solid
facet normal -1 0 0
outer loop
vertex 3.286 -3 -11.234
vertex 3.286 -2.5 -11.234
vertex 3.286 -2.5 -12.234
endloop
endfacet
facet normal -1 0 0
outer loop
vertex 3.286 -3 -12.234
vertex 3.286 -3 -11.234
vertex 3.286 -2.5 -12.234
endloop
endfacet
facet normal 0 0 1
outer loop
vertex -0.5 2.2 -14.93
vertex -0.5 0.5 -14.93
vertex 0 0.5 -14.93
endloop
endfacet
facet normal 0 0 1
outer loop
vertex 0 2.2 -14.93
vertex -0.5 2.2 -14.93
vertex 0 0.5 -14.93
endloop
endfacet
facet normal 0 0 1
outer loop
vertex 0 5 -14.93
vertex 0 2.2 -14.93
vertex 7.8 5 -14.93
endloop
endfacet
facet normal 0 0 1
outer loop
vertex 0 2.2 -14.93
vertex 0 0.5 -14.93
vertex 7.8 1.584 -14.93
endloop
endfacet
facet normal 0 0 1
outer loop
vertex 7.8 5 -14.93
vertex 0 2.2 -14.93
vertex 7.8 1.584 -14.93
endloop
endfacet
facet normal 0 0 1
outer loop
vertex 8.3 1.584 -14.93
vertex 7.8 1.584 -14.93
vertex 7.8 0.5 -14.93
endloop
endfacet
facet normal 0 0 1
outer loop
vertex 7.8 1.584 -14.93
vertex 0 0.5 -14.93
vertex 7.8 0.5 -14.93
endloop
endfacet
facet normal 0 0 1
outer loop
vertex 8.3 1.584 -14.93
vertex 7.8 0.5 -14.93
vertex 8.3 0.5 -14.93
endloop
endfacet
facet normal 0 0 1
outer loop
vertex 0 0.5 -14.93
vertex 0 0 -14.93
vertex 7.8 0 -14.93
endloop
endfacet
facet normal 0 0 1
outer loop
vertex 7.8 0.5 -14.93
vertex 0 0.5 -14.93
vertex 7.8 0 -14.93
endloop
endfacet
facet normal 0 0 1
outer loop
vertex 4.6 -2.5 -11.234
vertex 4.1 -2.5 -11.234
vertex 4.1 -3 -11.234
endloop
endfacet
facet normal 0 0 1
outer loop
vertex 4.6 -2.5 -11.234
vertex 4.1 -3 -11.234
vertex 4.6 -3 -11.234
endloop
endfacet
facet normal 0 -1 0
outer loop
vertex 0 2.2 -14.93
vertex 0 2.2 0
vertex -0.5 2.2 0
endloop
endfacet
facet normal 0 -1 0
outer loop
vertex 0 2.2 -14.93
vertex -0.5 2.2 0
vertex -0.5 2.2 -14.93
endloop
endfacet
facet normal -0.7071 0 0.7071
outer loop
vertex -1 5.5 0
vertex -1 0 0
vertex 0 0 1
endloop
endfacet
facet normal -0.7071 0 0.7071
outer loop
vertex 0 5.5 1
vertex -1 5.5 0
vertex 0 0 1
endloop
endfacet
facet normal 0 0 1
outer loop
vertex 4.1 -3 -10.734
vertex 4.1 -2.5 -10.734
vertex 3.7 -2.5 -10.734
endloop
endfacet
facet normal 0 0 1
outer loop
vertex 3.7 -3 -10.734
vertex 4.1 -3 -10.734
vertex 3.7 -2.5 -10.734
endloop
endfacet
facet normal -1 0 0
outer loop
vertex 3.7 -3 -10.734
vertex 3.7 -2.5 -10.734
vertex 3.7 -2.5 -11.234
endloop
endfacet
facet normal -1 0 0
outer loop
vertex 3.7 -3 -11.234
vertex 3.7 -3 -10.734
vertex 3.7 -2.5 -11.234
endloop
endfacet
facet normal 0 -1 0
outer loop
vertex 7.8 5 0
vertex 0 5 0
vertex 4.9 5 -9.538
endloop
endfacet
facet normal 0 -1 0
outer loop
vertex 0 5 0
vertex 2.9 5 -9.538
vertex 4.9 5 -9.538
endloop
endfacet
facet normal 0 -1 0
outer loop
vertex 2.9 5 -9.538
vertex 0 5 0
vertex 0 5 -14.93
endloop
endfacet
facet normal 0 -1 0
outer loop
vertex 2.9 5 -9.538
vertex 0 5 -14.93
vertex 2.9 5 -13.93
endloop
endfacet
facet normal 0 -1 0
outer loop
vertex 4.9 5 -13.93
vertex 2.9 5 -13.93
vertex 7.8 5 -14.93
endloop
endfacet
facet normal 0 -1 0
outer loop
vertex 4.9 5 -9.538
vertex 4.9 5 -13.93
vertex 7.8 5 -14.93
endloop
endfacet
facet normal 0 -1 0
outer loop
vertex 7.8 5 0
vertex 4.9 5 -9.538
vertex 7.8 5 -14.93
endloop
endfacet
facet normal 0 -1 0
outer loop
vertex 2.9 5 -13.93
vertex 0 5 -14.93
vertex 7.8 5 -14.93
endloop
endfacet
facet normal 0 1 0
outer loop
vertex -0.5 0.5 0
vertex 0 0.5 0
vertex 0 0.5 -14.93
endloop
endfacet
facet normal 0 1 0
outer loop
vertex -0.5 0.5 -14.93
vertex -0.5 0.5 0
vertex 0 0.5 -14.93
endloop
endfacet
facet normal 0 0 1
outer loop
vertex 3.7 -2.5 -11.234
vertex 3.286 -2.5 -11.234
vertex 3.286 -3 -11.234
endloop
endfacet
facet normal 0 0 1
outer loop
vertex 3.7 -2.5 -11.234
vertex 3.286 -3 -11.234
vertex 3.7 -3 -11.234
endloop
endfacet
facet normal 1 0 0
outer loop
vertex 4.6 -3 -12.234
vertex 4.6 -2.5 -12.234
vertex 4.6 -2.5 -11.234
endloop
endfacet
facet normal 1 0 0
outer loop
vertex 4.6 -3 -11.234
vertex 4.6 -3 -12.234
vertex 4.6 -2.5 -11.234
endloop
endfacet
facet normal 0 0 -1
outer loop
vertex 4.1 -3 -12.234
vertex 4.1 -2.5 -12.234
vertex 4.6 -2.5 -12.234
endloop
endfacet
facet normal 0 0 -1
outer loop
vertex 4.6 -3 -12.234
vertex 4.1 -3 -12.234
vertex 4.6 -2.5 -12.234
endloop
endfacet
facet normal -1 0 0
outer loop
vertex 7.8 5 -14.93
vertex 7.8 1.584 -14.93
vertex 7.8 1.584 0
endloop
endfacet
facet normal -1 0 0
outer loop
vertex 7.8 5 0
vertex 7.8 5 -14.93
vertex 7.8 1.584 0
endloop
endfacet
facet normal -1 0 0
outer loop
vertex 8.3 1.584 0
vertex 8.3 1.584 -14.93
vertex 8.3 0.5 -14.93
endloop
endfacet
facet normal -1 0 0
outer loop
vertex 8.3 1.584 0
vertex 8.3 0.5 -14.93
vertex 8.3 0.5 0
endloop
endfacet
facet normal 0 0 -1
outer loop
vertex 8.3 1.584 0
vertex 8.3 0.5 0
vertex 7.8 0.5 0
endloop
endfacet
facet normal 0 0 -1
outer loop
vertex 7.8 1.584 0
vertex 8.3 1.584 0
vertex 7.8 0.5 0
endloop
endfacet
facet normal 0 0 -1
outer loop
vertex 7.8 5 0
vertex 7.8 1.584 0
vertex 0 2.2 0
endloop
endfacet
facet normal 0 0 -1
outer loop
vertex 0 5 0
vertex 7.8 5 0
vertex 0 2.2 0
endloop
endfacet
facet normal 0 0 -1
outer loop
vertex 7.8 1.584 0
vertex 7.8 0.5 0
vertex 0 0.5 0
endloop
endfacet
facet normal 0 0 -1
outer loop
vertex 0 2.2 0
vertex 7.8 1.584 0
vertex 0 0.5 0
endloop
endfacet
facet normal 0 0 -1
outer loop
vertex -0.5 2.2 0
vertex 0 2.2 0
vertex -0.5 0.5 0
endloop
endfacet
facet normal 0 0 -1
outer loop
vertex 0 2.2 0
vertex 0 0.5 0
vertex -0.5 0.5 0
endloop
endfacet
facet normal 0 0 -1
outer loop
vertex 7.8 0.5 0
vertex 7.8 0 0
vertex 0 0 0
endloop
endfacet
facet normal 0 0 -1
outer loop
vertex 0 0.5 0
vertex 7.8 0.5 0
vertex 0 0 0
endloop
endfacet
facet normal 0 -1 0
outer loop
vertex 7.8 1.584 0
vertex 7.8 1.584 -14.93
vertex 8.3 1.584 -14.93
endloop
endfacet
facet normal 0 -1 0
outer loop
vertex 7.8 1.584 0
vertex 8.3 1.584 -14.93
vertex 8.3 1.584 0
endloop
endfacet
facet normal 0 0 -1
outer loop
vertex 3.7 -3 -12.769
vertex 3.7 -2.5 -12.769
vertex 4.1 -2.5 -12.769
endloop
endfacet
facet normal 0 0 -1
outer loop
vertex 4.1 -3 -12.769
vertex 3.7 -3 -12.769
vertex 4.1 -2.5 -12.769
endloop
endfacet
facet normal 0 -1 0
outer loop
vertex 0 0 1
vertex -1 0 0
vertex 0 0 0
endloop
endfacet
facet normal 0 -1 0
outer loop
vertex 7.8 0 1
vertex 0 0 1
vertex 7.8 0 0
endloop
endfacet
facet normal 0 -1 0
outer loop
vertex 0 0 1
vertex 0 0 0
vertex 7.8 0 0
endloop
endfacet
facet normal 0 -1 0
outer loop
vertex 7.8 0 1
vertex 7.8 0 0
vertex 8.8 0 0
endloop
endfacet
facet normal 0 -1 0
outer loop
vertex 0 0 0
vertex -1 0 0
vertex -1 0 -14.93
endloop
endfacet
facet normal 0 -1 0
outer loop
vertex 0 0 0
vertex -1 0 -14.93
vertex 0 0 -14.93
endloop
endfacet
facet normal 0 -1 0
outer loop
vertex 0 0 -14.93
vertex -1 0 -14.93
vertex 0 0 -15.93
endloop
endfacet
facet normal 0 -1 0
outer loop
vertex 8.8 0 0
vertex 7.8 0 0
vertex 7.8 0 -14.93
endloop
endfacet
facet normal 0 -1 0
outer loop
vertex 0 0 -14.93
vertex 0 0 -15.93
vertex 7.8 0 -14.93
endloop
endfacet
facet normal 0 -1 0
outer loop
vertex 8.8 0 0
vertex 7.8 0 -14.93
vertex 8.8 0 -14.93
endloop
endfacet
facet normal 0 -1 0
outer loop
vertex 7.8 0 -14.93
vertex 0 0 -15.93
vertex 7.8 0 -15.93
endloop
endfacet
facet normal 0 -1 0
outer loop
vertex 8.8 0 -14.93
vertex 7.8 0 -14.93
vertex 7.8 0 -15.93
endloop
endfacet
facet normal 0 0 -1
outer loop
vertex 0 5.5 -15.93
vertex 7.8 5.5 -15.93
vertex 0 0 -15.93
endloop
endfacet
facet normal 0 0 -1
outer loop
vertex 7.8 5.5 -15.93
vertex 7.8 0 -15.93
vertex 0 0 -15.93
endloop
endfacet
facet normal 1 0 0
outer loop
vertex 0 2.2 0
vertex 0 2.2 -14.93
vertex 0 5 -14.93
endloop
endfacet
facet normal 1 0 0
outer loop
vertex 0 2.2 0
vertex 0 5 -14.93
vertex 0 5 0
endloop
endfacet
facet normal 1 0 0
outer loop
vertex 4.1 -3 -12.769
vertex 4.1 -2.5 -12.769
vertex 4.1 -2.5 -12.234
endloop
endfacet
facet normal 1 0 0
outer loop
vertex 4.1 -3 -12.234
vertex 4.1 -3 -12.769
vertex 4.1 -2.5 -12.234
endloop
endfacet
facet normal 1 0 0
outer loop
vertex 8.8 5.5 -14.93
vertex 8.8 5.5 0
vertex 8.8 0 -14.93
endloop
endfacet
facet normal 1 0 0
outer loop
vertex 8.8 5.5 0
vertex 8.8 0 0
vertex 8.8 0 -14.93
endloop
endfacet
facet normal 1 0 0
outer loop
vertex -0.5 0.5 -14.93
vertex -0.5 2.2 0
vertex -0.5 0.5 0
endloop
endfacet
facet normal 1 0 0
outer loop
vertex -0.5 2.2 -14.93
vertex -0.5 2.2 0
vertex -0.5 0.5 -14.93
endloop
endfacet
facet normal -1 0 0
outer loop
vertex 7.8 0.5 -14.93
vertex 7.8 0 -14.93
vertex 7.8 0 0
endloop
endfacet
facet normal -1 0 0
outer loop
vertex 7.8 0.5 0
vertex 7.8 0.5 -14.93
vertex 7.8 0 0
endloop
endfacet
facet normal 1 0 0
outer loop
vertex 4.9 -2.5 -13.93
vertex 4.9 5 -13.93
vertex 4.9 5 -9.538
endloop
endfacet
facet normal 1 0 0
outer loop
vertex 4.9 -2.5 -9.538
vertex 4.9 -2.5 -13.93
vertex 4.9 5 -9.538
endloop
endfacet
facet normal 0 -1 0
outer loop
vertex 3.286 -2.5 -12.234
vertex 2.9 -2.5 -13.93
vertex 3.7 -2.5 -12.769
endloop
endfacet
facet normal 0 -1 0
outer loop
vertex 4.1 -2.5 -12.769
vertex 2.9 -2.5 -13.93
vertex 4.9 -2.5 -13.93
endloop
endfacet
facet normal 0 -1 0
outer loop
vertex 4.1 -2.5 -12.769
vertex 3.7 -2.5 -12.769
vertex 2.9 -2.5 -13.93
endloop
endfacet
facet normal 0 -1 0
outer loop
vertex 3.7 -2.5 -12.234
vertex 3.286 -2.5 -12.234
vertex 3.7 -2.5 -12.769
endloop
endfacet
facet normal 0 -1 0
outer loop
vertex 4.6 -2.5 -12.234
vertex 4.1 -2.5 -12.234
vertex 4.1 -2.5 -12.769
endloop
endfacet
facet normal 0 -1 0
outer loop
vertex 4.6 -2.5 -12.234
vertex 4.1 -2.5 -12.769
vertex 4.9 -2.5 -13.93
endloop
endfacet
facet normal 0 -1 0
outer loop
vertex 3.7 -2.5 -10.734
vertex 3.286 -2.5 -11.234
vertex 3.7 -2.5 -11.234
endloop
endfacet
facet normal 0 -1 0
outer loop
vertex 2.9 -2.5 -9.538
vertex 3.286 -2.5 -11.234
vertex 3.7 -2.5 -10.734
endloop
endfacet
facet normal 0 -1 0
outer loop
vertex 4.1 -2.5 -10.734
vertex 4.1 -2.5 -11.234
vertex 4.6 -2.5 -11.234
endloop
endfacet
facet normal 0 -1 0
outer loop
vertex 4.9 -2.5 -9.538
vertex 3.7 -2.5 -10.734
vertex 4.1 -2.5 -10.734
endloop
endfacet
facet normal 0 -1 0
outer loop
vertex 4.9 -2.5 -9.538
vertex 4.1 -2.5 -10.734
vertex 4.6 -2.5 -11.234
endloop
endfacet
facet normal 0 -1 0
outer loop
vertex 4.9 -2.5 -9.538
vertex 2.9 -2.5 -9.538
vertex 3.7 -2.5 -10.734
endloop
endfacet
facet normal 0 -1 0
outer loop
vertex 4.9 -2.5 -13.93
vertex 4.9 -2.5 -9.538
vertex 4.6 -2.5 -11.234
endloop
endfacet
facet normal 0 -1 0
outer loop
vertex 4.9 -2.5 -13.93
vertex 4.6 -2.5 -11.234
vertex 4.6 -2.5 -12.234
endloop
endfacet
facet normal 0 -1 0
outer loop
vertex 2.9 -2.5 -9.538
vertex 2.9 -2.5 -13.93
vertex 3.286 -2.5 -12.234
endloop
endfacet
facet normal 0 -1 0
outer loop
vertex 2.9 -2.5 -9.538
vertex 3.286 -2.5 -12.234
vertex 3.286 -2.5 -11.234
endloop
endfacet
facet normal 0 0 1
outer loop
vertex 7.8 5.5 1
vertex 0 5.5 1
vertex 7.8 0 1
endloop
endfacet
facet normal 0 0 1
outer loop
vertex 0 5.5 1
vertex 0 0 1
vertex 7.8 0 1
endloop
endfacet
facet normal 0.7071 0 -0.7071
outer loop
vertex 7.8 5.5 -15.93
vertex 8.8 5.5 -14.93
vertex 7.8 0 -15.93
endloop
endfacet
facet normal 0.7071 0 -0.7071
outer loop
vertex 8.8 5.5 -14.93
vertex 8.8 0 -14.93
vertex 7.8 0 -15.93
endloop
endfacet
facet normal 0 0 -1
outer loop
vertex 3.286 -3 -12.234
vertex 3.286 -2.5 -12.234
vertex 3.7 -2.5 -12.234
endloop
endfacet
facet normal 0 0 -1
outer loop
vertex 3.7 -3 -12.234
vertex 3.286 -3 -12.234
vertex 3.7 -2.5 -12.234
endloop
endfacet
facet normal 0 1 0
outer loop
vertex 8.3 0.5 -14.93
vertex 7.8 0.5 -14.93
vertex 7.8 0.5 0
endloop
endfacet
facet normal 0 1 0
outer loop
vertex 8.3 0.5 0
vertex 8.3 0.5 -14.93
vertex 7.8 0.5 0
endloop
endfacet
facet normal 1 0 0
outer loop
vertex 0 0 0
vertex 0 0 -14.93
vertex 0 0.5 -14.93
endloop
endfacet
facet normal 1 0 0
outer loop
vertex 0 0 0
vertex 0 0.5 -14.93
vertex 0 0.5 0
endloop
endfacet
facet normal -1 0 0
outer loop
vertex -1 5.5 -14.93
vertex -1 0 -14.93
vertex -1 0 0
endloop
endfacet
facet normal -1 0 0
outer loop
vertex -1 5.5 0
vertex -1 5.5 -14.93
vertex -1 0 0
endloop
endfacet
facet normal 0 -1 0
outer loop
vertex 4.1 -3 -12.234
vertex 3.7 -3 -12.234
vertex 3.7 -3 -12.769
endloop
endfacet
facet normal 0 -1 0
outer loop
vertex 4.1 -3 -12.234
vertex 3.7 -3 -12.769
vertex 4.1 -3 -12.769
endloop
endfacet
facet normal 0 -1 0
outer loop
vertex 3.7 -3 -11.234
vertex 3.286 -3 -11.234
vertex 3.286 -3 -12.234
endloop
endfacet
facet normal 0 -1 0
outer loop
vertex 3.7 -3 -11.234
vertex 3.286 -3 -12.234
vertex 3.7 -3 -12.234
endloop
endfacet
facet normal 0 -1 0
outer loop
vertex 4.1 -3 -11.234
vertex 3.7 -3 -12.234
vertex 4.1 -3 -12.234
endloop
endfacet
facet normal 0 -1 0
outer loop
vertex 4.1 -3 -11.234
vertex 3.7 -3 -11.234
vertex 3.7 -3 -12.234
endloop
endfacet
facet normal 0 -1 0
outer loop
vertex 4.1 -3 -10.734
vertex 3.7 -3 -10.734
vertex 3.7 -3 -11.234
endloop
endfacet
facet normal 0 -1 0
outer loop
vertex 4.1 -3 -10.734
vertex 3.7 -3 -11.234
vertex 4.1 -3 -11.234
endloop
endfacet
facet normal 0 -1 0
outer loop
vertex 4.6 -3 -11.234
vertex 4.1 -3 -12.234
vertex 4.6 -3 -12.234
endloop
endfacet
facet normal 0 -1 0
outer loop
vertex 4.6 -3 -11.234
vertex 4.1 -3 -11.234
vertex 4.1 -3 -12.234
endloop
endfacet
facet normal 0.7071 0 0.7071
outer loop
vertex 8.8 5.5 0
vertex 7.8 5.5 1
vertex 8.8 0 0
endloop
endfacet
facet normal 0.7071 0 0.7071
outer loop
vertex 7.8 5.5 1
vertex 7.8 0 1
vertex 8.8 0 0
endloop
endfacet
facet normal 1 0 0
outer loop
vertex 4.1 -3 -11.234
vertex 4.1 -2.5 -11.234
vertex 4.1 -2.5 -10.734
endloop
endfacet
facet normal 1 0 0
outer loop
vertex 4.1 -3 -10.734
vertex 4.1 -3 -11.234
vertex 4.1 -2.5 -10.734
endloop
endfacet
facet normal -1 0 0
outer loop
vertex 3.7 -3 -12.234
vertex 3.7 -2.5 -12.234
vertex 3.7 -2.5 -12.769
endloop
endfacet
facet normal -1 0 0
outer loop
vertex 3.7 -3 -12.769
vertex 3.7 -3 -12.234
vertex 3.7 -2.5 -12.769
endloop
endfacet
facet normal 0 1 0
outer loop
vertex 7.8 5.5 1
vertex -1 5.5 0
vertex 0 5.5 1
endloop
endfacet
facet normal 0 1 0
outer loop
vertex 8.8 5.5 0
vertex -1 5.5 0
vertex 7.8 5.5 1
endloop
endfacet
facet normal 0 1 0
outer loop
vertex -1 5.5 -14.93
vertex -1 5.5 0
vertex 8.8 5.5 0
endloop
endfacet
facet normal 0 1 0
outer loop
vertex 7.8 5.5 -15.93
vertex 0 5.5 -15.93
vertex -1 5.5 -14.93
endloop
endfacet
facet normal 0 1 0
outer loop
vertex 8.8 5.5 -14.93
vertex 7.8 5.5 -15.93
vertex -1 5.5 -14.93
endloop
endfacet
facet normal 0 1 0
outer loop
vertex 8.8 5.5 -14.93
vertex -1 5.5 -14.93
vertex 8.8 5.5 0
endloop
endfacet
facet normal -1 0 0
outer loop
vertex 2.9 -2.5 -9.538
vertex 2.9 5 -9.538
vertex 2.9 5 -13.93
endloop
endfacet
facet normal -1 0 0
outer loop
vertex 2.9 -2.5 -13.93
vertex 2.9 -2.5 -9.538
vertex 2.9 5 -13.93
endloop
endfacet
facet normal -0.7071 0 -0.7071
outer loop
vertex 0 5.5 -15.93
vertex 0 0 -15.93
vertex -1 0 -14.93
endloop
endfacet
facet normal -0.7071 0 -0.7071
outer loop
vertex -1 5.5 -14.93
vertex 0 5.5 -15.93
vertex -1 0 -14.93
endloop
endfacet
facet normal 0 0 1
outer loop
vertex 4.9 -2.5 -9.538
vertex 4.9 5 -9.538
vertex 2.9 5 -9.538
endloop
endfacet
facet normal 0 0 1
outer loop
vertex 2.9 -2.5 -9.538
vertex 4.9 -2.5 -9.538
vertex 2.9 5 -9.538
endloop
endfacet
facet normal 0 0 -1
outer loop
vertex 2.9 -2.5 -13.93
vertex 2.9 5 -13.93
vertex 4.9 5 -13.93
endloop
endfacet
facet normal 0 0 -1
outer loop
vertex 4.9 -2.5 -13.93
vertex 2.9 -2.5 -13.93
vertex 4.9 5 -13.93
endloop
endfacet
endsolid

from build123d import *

# Parameters (mm, degrees)
SKETCH1_W           = 7.8
SKETCH1_H           = 1
BOSS_EXTRUDE1_DEPTH = 5
SKETCH2_W           = 7.465
SKETCH2_H           = 0.5
CUT_EXTRUDE1_DEPTH  = 0.5
SKETCH3_W           = 14.93
SKETCH3_H           = 0.5
CUT_EXTRUDE2_DEPTH  = 0.5
BOSS_EXTRUDE2_DEPTH = 0.5
SKETCH5_W           = 1
SKETCH5_H           = 2.195949596
BOSS_EXTRUDE3_DEPTH = 7.5
SKETCH6_W           = 0.2
SKETCH6_H           = 0.5
SKETCH6_W_2         = 0.5
SKETCH6_W_3         = 0.413933432
BOSS_EXTRUDE4_DEPTH = 0.5
SKETCH8_W           = 14.93
SKETCH8_H           = 0.5
CUT_EXTRUDE3_DEPTH  = 0.5
SKETCH9_W           = 14.93
SKETCH9_H           = 0.084331677
CUT_EXTRUDE4_DEPTH  = 0.5
SKETCH12_W          = 14.93
SKETCH12_H          = 1.2
CUT_EXTRUDE5_DEPTH  = 0.5


with BuildPart() as part:
    # Sketch1 → Boss-Extrude1 (new body)
    with BuildSketch(Plane(origin=(0, 0, 0), x_dir=(1, 0, 0), z_dir=(0, 1, 0))):
        with Locations((3.9, 15.43)):
            Rectangle(SKETCH1_W, SKETCH1_H)
        Polygon((7.8, 15.93), (8.8, 14.93), (7.8, 14.93), align=None)
        Polygon((7.8, -1), (7.8, 0), (7.8, 14.93), (8.8, 14.93), (8.8, 0), align=None)
        Polygon((-1, 0), (0, 0), (7.8, 0), (7.8, -1), (0, -1), align=None)
        Polygon((0, 15.93), (0, 14.93), (0, 0), (-1, 0), (-1, 14.93), align=None)
    extrude(amount=BOSS_EXTRUDE1_DEPTH)

    # Sketch2 → Cut-Extrude1 (cut)
    with BuildSketch(Plane(origin=(0, 0, 0), x_dir=(0, 0, -1), z_dir=(1, 0, 0))):
        with Locations((11.1975, 0.75)):
            Rectangle(SKETCH2_W, SKETCH2_H)
        with Locations((3.7325, 0.75)):
            Rectangle(SKETCH2_W, SKETCH2_H)
    extrude(amount=-CUT_EXTRUDE1_DEPTH, mode=Mode.SUBTRACT)

    # Sketch3 → Cut-Extrude2 (cut)
    with BuildSketch(Plane.ZY.offset(-7.8)):
        with Locations((-7.465, 0.75)):
            Rectangle(SKETCH3_W, SKETCH3_H)
    extrude(amount=-CUT_EXTRUDE2_DEPTH, mode=Mode.SUBTRACT)

    # Sketch4 → Boss-Extrude2 (add)
    with BuildSketch(Plane(origin=(0, 5, 0), x_dir=(1, 0, 0), z_dir=(0, 1, 0))):
        Polygon((-1, 0), (0, -1), (7.8, -1), (8.8, 0), (8.8, 14.93), (7.8, 15.93), (0, 15.93), (-1, 14.93), align=None)
    extrude(amount=BOSS_EXTRUDE2_DEPTH)

    # Sketch5 → Boss-Extrude3 (add)
    with BuildSketch(Plane.XZ.offset(-5)):
        with Locations((4.4, -12.832025202)):
            Rectangle(SKETCH5_W, SKETCH5_H)
        with Locations((3.4, -12.832025202)):
            Rectangle(SKETCH5_W, SKETCH5_H)
        with Locations((3.4, -10.636075606)):
            Rectangle(SKETCH5_W, SKETCH5_H)
        with Locations((4.4, -10.636075606)):
            Rectangle(SKETCH5_W, SKETCH5_H)
    extrude(amount=BOSS_EXTRUDE3_DEPTH)

    # Sketch6 → Boss-Extrude4 (add)
    with BuildSketch(Plane.XZ.offset(2.5)):
        with Locations((4, -10.984050404)):
            Rectangle(SKETCH6_W, SKETCH6_H)
        with Locations((3.8, -10.984050404)):
            Rectangle(SKETCH6_W, SKETCH6_H)
        with Locations((3.8, -11.484050404)):
            Rectangle(SKETCH6_W, SKETCH6_H)
        with Locations((4, -11.484050404)):
            Rectangle(SKETCH6_W, SKETCH6_H)
        with Locations((4.35, -11.484050404)):
            Rectangle(SKETCH6_W_2, SKETCH6_H)
        with Locations((4.35, -11.984050404)):
            Rectangle(SKETCH6_W_2, SKETCH6_H)
        Polygon((3.9, -11.734050404), (3.7, -11.734050404), (3.7, -12.234050404), (3.986066568, -12.234050404), (4.1, -12.234050404), (4.1, -11.734050404), align=None)
        with Locations((3.493033284, -11.484050404)):
            Rectangle(SKETCH6_W_3, SKETCH6_H)
        with Locations((3.493033284, -11.984050404)):
            Rectangle(SKETCH6_W_3, SKETCH6_H)
        Polygon((3.986066568, -12.234050404), (3.7, -12.234050404), (3.7, -12.768693535), (4.1, -12.768693535), (4.1, -12.234050404), align=None)
    extrude(amount=BOSS_EXTRUDE4_DEPTH)

    # Sketch8 → Cut-Extrude3 (cut)
    with BuildSketch(Plane.ZY.offset(-7.8)):
        with Locations((-7.465, 1.334331677)):
            Rectangle(SKETCH8_W, SKETCH8_H)
    extrude(amount=-CUT_EXTRUDE3_DEPTH, mode=Mode.SUBTRACT)

    # Sketch9 → Cut-Extrude4 (cut)
    with BuildSketch(Plane.ZY.offset(-7.8)):
        with Locations((-7.465, 1.042165838)):
            Rectangle(SKETCH9_W, SKETCH9_H)
    extrude(amount=-CUT_EXTRUDE4_DEPTH, mode=Mode.SUBTRACT)

    # Sketch12 → Cut-Extrude5 (cut)
    with BuildSketch(Plane(origin=(0, 0, 0), x_dir=(0, 0, -1), z_dir=(1, 0, 0))):
        with Locations((7.465, 1.6)):
            Rectangle(SKETCH12_W, SKETCH12_H)
    extrude(amount=-CUT_EXTRUDE5_DEPTH, mode=Mode.SUBTRACT)


solid = part.part
